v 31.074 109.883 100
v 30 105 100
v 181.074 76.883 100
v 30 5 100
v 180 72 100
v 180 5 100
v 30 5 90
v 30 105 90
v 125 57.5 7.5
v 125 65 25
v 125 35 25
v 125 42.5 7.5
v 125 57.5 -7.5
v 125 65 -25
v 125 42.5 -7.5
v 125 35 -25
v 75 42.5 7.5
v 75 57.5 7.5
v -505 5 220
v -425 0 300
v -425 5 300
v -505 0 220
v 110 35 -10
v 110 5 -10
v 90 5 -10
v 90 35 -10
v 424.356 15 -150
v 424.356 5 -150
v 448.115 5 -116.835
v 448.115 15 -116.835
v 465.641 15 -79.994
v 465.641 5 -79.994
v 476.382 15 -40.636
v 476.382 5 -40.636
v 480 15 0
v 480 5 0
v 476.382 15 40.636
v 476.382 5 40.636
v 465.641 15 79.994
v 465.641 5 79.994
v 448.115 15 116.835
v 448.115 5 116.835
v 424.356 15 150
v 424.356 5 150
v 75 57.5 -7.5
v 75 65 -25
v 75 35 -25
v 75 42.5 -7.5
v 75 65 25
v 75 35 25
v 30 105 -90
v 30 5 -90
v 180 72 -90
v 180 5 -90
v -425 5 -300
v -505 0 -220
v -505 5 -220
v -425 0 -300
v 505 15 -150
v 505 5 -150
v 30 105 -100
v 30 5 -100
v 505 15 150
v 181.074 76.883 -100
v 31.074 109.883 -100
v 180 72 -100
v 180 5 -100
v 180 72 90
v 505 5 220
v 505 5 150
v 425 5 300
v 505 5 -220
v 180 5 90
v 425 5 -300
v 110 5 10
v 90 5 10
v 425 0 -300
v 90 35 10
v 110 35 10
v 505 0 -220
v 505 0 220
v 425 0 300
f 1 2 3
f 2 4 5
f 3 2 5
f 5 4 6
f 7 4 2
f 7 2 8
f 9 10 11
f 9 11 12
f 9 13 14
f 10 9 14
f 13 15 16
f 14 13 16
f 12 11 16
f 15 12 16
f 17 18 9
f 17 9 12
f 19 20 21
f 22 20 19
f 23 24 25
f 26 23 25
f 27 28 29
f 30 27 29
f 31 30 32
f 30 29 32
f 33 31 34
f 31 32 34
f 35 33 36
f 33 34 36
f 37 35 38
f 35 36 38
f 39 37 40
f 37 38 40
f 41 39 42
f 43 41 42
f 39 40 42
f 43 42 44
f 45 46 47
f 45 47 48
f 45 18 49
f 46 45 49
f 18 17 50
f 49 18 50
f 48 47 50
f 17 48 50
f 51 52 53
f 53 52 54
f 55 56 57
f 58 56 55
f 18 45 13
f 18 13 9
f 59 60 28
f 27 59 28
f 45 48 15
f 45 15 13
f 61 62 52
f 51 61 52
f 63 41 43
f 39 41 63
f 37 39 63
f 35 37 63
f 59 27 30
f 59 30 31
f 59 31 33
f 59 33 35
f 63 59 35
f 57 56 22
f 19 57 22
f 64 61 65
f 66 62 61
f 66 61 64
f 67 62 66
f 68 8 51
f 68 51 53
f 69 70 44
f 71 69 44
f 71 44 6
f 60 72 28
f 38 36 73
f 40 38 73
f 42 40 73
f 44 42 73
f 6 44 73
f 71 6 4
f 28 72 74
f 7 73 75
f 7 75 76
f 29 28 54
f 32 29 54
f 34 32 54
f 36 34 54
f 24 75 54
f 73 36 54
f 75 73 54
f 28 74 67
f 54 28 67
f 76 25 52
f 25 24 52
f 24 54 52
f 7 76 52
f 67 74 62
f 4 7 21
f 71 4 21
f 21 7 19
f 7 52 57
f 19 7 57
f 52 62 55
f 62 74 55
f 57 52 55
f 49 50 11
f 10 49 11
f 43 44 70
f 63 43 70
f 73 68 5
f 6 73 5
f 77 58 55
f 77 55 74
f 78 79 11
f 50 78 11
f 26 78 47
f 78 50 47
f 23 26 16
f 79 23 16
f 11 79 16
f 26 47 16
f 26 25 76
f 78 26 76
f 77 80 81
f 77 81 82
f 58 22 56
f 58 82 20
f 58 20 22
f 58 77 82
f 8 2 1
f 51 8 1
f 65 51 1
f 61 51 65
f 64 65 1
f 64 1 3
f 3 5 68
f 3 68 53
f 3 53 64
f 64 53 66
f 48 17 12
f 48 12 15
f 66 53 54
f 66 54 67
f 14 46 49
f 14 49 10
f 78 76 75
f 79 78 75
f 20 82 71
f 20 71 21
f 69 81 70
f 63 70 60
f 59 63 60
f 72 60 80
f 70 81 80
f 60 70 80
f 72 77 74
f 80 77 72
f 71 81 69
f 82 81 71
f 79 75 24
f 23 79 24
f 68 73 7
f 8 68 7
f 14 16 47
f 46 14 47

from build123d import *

# Parameters (mm, degrees)
EXTRUDE_1_DEPTH     = 5
EXTRUDE_5_DEPTH     = 30
EXTRUDE_6_DEPTH     = 30
CUT_EXTRUDE_1_DEPTH = 50
EXTRUDE_7_DEPTH     = 10
EXTRUDE_9_DEPTH     = 100
CUT_EXTRUDE_2_DEPTH = 653.725056973
SKETCH_15_W         = 153.587108834
SKETCH_15_H         = 200
EXTRUDE_11_DEPTH    = 5


with BuildPart() as part:
    # 草图1 → 凸台-拉伸1 (new body)
    with BuildSketch(Plane(origin=(0, 0, 0), x_dir=(1, 0, 0), z_dir=(0, 1, 0))):
        Polygon((-505, -50), (-505, 220), (-425, 300), (425, 300), (505, 220), (505, -10), (505, -220), (425, -300), (-425, -300), (-505, -220), align=None)
    extrude(amount=EXTRUDE_1_DEPTH)

    # 草图5 → 凸台-拉伸5 (add)
    with BuildSketch(Plane(origin=(0, 5, 0), x_dir=(1, 0, 0), z_dir=(0, 1, 0))):
        Polygon((90, 0), (90, -10), (110, -10), (110, 10), (90, 10), align=None)
    extrude(amount=EXTRUDE_5_DEPTH)

    # 草图6 → 凸台-拉伸6 (add)
    with BuildSketch(Plane(origin=(0, 35, 0), x_dir=(1, 0, 0), z_dir=(0, 1, 0))):
        Polygon((100, -25), (125, -25), (125, 25), (75, 25), (75, -25), align=None)
    extrude(amount=EXTRUDE_6_DEPTH)

    # 草图7 → 切除-拉伸1 (cut)
    with BuildSketch(Plane(origin=(125, 0, 0), x_dir=(0, 0, -1), z_dir=(1, 0, 0))):
        Polygon((0, 57.5), (-7.5, 57.5), (-7.5, 42.5), (7.5, 42.5), (7.5, 57.5), align=None)
    extrude(amount=-CUT_EXTRUDE_1_DEPTH, mode=Mode.SUBTRACT)

    # 草图8 → 凸台-拉伸7 (add)
    with BuildSketch(Plane(origin=(0, 5, 0), x_dir=(1, 0, 0), z_dir=(0, 1, 0))):
        with BuildLine():
            Line((505, 0), (505, 150))
            Line((505, 150), (424.355957742, 150))
            ThreePointArc((424.355957742, 150), (480, 0), (424.355957742, -150))
            Line((424.355957742, -150), (505, -150))
            Line((505, -150), (505, 0))
        make_face()
    extrude(amount=EXTRUDE_7_DEPTH)

    # 草图12 → 凸台-拉伸9 (add)
    with BuildSketch(Plane(origin=(0, 5, 0), x_dir=(1, 0, 0), z_dir=(0, 1, 0))):
        Polygon((30, -90), (100, -90), (180, -90), (180, -100), (100, -100), (30, -100), align=None)
        Polygon((100, 100), (30, 100), (30, 90), (100, 90), (180, 90), (180, 100), align=None)
    extrude(amount=EXTRUDE_9_DEPTH)

    # 草图13 → 切除-拉伸2 (cut, through all)
    with BuildSketch(Plane.XY.offset(100)):
        Polygon((180, 105), (180, 72), (30, 105), align=None)
    extrude(amount=-CUT_EXTRUDE_2_DEPTH, mode=Mode.SUBTRACT)

    # 草图15 → 凸台-拉伸11 (add)
    with BuildSketch(Plane(origin=(23.418542541, 106.447920641, 0), x_dir=(0.9766444667050901, -0.21486178267511977, 0), z_dir=(0.21486178267511977, 0.9766444667050901, 0))):
        with Locations((83.532401237, 0)):
            Rectangle(SKETCH_15_W, SKETCH_15_H)
    extrude(amount=EXTRUDE_11_DEPTH)


solid = part.part
